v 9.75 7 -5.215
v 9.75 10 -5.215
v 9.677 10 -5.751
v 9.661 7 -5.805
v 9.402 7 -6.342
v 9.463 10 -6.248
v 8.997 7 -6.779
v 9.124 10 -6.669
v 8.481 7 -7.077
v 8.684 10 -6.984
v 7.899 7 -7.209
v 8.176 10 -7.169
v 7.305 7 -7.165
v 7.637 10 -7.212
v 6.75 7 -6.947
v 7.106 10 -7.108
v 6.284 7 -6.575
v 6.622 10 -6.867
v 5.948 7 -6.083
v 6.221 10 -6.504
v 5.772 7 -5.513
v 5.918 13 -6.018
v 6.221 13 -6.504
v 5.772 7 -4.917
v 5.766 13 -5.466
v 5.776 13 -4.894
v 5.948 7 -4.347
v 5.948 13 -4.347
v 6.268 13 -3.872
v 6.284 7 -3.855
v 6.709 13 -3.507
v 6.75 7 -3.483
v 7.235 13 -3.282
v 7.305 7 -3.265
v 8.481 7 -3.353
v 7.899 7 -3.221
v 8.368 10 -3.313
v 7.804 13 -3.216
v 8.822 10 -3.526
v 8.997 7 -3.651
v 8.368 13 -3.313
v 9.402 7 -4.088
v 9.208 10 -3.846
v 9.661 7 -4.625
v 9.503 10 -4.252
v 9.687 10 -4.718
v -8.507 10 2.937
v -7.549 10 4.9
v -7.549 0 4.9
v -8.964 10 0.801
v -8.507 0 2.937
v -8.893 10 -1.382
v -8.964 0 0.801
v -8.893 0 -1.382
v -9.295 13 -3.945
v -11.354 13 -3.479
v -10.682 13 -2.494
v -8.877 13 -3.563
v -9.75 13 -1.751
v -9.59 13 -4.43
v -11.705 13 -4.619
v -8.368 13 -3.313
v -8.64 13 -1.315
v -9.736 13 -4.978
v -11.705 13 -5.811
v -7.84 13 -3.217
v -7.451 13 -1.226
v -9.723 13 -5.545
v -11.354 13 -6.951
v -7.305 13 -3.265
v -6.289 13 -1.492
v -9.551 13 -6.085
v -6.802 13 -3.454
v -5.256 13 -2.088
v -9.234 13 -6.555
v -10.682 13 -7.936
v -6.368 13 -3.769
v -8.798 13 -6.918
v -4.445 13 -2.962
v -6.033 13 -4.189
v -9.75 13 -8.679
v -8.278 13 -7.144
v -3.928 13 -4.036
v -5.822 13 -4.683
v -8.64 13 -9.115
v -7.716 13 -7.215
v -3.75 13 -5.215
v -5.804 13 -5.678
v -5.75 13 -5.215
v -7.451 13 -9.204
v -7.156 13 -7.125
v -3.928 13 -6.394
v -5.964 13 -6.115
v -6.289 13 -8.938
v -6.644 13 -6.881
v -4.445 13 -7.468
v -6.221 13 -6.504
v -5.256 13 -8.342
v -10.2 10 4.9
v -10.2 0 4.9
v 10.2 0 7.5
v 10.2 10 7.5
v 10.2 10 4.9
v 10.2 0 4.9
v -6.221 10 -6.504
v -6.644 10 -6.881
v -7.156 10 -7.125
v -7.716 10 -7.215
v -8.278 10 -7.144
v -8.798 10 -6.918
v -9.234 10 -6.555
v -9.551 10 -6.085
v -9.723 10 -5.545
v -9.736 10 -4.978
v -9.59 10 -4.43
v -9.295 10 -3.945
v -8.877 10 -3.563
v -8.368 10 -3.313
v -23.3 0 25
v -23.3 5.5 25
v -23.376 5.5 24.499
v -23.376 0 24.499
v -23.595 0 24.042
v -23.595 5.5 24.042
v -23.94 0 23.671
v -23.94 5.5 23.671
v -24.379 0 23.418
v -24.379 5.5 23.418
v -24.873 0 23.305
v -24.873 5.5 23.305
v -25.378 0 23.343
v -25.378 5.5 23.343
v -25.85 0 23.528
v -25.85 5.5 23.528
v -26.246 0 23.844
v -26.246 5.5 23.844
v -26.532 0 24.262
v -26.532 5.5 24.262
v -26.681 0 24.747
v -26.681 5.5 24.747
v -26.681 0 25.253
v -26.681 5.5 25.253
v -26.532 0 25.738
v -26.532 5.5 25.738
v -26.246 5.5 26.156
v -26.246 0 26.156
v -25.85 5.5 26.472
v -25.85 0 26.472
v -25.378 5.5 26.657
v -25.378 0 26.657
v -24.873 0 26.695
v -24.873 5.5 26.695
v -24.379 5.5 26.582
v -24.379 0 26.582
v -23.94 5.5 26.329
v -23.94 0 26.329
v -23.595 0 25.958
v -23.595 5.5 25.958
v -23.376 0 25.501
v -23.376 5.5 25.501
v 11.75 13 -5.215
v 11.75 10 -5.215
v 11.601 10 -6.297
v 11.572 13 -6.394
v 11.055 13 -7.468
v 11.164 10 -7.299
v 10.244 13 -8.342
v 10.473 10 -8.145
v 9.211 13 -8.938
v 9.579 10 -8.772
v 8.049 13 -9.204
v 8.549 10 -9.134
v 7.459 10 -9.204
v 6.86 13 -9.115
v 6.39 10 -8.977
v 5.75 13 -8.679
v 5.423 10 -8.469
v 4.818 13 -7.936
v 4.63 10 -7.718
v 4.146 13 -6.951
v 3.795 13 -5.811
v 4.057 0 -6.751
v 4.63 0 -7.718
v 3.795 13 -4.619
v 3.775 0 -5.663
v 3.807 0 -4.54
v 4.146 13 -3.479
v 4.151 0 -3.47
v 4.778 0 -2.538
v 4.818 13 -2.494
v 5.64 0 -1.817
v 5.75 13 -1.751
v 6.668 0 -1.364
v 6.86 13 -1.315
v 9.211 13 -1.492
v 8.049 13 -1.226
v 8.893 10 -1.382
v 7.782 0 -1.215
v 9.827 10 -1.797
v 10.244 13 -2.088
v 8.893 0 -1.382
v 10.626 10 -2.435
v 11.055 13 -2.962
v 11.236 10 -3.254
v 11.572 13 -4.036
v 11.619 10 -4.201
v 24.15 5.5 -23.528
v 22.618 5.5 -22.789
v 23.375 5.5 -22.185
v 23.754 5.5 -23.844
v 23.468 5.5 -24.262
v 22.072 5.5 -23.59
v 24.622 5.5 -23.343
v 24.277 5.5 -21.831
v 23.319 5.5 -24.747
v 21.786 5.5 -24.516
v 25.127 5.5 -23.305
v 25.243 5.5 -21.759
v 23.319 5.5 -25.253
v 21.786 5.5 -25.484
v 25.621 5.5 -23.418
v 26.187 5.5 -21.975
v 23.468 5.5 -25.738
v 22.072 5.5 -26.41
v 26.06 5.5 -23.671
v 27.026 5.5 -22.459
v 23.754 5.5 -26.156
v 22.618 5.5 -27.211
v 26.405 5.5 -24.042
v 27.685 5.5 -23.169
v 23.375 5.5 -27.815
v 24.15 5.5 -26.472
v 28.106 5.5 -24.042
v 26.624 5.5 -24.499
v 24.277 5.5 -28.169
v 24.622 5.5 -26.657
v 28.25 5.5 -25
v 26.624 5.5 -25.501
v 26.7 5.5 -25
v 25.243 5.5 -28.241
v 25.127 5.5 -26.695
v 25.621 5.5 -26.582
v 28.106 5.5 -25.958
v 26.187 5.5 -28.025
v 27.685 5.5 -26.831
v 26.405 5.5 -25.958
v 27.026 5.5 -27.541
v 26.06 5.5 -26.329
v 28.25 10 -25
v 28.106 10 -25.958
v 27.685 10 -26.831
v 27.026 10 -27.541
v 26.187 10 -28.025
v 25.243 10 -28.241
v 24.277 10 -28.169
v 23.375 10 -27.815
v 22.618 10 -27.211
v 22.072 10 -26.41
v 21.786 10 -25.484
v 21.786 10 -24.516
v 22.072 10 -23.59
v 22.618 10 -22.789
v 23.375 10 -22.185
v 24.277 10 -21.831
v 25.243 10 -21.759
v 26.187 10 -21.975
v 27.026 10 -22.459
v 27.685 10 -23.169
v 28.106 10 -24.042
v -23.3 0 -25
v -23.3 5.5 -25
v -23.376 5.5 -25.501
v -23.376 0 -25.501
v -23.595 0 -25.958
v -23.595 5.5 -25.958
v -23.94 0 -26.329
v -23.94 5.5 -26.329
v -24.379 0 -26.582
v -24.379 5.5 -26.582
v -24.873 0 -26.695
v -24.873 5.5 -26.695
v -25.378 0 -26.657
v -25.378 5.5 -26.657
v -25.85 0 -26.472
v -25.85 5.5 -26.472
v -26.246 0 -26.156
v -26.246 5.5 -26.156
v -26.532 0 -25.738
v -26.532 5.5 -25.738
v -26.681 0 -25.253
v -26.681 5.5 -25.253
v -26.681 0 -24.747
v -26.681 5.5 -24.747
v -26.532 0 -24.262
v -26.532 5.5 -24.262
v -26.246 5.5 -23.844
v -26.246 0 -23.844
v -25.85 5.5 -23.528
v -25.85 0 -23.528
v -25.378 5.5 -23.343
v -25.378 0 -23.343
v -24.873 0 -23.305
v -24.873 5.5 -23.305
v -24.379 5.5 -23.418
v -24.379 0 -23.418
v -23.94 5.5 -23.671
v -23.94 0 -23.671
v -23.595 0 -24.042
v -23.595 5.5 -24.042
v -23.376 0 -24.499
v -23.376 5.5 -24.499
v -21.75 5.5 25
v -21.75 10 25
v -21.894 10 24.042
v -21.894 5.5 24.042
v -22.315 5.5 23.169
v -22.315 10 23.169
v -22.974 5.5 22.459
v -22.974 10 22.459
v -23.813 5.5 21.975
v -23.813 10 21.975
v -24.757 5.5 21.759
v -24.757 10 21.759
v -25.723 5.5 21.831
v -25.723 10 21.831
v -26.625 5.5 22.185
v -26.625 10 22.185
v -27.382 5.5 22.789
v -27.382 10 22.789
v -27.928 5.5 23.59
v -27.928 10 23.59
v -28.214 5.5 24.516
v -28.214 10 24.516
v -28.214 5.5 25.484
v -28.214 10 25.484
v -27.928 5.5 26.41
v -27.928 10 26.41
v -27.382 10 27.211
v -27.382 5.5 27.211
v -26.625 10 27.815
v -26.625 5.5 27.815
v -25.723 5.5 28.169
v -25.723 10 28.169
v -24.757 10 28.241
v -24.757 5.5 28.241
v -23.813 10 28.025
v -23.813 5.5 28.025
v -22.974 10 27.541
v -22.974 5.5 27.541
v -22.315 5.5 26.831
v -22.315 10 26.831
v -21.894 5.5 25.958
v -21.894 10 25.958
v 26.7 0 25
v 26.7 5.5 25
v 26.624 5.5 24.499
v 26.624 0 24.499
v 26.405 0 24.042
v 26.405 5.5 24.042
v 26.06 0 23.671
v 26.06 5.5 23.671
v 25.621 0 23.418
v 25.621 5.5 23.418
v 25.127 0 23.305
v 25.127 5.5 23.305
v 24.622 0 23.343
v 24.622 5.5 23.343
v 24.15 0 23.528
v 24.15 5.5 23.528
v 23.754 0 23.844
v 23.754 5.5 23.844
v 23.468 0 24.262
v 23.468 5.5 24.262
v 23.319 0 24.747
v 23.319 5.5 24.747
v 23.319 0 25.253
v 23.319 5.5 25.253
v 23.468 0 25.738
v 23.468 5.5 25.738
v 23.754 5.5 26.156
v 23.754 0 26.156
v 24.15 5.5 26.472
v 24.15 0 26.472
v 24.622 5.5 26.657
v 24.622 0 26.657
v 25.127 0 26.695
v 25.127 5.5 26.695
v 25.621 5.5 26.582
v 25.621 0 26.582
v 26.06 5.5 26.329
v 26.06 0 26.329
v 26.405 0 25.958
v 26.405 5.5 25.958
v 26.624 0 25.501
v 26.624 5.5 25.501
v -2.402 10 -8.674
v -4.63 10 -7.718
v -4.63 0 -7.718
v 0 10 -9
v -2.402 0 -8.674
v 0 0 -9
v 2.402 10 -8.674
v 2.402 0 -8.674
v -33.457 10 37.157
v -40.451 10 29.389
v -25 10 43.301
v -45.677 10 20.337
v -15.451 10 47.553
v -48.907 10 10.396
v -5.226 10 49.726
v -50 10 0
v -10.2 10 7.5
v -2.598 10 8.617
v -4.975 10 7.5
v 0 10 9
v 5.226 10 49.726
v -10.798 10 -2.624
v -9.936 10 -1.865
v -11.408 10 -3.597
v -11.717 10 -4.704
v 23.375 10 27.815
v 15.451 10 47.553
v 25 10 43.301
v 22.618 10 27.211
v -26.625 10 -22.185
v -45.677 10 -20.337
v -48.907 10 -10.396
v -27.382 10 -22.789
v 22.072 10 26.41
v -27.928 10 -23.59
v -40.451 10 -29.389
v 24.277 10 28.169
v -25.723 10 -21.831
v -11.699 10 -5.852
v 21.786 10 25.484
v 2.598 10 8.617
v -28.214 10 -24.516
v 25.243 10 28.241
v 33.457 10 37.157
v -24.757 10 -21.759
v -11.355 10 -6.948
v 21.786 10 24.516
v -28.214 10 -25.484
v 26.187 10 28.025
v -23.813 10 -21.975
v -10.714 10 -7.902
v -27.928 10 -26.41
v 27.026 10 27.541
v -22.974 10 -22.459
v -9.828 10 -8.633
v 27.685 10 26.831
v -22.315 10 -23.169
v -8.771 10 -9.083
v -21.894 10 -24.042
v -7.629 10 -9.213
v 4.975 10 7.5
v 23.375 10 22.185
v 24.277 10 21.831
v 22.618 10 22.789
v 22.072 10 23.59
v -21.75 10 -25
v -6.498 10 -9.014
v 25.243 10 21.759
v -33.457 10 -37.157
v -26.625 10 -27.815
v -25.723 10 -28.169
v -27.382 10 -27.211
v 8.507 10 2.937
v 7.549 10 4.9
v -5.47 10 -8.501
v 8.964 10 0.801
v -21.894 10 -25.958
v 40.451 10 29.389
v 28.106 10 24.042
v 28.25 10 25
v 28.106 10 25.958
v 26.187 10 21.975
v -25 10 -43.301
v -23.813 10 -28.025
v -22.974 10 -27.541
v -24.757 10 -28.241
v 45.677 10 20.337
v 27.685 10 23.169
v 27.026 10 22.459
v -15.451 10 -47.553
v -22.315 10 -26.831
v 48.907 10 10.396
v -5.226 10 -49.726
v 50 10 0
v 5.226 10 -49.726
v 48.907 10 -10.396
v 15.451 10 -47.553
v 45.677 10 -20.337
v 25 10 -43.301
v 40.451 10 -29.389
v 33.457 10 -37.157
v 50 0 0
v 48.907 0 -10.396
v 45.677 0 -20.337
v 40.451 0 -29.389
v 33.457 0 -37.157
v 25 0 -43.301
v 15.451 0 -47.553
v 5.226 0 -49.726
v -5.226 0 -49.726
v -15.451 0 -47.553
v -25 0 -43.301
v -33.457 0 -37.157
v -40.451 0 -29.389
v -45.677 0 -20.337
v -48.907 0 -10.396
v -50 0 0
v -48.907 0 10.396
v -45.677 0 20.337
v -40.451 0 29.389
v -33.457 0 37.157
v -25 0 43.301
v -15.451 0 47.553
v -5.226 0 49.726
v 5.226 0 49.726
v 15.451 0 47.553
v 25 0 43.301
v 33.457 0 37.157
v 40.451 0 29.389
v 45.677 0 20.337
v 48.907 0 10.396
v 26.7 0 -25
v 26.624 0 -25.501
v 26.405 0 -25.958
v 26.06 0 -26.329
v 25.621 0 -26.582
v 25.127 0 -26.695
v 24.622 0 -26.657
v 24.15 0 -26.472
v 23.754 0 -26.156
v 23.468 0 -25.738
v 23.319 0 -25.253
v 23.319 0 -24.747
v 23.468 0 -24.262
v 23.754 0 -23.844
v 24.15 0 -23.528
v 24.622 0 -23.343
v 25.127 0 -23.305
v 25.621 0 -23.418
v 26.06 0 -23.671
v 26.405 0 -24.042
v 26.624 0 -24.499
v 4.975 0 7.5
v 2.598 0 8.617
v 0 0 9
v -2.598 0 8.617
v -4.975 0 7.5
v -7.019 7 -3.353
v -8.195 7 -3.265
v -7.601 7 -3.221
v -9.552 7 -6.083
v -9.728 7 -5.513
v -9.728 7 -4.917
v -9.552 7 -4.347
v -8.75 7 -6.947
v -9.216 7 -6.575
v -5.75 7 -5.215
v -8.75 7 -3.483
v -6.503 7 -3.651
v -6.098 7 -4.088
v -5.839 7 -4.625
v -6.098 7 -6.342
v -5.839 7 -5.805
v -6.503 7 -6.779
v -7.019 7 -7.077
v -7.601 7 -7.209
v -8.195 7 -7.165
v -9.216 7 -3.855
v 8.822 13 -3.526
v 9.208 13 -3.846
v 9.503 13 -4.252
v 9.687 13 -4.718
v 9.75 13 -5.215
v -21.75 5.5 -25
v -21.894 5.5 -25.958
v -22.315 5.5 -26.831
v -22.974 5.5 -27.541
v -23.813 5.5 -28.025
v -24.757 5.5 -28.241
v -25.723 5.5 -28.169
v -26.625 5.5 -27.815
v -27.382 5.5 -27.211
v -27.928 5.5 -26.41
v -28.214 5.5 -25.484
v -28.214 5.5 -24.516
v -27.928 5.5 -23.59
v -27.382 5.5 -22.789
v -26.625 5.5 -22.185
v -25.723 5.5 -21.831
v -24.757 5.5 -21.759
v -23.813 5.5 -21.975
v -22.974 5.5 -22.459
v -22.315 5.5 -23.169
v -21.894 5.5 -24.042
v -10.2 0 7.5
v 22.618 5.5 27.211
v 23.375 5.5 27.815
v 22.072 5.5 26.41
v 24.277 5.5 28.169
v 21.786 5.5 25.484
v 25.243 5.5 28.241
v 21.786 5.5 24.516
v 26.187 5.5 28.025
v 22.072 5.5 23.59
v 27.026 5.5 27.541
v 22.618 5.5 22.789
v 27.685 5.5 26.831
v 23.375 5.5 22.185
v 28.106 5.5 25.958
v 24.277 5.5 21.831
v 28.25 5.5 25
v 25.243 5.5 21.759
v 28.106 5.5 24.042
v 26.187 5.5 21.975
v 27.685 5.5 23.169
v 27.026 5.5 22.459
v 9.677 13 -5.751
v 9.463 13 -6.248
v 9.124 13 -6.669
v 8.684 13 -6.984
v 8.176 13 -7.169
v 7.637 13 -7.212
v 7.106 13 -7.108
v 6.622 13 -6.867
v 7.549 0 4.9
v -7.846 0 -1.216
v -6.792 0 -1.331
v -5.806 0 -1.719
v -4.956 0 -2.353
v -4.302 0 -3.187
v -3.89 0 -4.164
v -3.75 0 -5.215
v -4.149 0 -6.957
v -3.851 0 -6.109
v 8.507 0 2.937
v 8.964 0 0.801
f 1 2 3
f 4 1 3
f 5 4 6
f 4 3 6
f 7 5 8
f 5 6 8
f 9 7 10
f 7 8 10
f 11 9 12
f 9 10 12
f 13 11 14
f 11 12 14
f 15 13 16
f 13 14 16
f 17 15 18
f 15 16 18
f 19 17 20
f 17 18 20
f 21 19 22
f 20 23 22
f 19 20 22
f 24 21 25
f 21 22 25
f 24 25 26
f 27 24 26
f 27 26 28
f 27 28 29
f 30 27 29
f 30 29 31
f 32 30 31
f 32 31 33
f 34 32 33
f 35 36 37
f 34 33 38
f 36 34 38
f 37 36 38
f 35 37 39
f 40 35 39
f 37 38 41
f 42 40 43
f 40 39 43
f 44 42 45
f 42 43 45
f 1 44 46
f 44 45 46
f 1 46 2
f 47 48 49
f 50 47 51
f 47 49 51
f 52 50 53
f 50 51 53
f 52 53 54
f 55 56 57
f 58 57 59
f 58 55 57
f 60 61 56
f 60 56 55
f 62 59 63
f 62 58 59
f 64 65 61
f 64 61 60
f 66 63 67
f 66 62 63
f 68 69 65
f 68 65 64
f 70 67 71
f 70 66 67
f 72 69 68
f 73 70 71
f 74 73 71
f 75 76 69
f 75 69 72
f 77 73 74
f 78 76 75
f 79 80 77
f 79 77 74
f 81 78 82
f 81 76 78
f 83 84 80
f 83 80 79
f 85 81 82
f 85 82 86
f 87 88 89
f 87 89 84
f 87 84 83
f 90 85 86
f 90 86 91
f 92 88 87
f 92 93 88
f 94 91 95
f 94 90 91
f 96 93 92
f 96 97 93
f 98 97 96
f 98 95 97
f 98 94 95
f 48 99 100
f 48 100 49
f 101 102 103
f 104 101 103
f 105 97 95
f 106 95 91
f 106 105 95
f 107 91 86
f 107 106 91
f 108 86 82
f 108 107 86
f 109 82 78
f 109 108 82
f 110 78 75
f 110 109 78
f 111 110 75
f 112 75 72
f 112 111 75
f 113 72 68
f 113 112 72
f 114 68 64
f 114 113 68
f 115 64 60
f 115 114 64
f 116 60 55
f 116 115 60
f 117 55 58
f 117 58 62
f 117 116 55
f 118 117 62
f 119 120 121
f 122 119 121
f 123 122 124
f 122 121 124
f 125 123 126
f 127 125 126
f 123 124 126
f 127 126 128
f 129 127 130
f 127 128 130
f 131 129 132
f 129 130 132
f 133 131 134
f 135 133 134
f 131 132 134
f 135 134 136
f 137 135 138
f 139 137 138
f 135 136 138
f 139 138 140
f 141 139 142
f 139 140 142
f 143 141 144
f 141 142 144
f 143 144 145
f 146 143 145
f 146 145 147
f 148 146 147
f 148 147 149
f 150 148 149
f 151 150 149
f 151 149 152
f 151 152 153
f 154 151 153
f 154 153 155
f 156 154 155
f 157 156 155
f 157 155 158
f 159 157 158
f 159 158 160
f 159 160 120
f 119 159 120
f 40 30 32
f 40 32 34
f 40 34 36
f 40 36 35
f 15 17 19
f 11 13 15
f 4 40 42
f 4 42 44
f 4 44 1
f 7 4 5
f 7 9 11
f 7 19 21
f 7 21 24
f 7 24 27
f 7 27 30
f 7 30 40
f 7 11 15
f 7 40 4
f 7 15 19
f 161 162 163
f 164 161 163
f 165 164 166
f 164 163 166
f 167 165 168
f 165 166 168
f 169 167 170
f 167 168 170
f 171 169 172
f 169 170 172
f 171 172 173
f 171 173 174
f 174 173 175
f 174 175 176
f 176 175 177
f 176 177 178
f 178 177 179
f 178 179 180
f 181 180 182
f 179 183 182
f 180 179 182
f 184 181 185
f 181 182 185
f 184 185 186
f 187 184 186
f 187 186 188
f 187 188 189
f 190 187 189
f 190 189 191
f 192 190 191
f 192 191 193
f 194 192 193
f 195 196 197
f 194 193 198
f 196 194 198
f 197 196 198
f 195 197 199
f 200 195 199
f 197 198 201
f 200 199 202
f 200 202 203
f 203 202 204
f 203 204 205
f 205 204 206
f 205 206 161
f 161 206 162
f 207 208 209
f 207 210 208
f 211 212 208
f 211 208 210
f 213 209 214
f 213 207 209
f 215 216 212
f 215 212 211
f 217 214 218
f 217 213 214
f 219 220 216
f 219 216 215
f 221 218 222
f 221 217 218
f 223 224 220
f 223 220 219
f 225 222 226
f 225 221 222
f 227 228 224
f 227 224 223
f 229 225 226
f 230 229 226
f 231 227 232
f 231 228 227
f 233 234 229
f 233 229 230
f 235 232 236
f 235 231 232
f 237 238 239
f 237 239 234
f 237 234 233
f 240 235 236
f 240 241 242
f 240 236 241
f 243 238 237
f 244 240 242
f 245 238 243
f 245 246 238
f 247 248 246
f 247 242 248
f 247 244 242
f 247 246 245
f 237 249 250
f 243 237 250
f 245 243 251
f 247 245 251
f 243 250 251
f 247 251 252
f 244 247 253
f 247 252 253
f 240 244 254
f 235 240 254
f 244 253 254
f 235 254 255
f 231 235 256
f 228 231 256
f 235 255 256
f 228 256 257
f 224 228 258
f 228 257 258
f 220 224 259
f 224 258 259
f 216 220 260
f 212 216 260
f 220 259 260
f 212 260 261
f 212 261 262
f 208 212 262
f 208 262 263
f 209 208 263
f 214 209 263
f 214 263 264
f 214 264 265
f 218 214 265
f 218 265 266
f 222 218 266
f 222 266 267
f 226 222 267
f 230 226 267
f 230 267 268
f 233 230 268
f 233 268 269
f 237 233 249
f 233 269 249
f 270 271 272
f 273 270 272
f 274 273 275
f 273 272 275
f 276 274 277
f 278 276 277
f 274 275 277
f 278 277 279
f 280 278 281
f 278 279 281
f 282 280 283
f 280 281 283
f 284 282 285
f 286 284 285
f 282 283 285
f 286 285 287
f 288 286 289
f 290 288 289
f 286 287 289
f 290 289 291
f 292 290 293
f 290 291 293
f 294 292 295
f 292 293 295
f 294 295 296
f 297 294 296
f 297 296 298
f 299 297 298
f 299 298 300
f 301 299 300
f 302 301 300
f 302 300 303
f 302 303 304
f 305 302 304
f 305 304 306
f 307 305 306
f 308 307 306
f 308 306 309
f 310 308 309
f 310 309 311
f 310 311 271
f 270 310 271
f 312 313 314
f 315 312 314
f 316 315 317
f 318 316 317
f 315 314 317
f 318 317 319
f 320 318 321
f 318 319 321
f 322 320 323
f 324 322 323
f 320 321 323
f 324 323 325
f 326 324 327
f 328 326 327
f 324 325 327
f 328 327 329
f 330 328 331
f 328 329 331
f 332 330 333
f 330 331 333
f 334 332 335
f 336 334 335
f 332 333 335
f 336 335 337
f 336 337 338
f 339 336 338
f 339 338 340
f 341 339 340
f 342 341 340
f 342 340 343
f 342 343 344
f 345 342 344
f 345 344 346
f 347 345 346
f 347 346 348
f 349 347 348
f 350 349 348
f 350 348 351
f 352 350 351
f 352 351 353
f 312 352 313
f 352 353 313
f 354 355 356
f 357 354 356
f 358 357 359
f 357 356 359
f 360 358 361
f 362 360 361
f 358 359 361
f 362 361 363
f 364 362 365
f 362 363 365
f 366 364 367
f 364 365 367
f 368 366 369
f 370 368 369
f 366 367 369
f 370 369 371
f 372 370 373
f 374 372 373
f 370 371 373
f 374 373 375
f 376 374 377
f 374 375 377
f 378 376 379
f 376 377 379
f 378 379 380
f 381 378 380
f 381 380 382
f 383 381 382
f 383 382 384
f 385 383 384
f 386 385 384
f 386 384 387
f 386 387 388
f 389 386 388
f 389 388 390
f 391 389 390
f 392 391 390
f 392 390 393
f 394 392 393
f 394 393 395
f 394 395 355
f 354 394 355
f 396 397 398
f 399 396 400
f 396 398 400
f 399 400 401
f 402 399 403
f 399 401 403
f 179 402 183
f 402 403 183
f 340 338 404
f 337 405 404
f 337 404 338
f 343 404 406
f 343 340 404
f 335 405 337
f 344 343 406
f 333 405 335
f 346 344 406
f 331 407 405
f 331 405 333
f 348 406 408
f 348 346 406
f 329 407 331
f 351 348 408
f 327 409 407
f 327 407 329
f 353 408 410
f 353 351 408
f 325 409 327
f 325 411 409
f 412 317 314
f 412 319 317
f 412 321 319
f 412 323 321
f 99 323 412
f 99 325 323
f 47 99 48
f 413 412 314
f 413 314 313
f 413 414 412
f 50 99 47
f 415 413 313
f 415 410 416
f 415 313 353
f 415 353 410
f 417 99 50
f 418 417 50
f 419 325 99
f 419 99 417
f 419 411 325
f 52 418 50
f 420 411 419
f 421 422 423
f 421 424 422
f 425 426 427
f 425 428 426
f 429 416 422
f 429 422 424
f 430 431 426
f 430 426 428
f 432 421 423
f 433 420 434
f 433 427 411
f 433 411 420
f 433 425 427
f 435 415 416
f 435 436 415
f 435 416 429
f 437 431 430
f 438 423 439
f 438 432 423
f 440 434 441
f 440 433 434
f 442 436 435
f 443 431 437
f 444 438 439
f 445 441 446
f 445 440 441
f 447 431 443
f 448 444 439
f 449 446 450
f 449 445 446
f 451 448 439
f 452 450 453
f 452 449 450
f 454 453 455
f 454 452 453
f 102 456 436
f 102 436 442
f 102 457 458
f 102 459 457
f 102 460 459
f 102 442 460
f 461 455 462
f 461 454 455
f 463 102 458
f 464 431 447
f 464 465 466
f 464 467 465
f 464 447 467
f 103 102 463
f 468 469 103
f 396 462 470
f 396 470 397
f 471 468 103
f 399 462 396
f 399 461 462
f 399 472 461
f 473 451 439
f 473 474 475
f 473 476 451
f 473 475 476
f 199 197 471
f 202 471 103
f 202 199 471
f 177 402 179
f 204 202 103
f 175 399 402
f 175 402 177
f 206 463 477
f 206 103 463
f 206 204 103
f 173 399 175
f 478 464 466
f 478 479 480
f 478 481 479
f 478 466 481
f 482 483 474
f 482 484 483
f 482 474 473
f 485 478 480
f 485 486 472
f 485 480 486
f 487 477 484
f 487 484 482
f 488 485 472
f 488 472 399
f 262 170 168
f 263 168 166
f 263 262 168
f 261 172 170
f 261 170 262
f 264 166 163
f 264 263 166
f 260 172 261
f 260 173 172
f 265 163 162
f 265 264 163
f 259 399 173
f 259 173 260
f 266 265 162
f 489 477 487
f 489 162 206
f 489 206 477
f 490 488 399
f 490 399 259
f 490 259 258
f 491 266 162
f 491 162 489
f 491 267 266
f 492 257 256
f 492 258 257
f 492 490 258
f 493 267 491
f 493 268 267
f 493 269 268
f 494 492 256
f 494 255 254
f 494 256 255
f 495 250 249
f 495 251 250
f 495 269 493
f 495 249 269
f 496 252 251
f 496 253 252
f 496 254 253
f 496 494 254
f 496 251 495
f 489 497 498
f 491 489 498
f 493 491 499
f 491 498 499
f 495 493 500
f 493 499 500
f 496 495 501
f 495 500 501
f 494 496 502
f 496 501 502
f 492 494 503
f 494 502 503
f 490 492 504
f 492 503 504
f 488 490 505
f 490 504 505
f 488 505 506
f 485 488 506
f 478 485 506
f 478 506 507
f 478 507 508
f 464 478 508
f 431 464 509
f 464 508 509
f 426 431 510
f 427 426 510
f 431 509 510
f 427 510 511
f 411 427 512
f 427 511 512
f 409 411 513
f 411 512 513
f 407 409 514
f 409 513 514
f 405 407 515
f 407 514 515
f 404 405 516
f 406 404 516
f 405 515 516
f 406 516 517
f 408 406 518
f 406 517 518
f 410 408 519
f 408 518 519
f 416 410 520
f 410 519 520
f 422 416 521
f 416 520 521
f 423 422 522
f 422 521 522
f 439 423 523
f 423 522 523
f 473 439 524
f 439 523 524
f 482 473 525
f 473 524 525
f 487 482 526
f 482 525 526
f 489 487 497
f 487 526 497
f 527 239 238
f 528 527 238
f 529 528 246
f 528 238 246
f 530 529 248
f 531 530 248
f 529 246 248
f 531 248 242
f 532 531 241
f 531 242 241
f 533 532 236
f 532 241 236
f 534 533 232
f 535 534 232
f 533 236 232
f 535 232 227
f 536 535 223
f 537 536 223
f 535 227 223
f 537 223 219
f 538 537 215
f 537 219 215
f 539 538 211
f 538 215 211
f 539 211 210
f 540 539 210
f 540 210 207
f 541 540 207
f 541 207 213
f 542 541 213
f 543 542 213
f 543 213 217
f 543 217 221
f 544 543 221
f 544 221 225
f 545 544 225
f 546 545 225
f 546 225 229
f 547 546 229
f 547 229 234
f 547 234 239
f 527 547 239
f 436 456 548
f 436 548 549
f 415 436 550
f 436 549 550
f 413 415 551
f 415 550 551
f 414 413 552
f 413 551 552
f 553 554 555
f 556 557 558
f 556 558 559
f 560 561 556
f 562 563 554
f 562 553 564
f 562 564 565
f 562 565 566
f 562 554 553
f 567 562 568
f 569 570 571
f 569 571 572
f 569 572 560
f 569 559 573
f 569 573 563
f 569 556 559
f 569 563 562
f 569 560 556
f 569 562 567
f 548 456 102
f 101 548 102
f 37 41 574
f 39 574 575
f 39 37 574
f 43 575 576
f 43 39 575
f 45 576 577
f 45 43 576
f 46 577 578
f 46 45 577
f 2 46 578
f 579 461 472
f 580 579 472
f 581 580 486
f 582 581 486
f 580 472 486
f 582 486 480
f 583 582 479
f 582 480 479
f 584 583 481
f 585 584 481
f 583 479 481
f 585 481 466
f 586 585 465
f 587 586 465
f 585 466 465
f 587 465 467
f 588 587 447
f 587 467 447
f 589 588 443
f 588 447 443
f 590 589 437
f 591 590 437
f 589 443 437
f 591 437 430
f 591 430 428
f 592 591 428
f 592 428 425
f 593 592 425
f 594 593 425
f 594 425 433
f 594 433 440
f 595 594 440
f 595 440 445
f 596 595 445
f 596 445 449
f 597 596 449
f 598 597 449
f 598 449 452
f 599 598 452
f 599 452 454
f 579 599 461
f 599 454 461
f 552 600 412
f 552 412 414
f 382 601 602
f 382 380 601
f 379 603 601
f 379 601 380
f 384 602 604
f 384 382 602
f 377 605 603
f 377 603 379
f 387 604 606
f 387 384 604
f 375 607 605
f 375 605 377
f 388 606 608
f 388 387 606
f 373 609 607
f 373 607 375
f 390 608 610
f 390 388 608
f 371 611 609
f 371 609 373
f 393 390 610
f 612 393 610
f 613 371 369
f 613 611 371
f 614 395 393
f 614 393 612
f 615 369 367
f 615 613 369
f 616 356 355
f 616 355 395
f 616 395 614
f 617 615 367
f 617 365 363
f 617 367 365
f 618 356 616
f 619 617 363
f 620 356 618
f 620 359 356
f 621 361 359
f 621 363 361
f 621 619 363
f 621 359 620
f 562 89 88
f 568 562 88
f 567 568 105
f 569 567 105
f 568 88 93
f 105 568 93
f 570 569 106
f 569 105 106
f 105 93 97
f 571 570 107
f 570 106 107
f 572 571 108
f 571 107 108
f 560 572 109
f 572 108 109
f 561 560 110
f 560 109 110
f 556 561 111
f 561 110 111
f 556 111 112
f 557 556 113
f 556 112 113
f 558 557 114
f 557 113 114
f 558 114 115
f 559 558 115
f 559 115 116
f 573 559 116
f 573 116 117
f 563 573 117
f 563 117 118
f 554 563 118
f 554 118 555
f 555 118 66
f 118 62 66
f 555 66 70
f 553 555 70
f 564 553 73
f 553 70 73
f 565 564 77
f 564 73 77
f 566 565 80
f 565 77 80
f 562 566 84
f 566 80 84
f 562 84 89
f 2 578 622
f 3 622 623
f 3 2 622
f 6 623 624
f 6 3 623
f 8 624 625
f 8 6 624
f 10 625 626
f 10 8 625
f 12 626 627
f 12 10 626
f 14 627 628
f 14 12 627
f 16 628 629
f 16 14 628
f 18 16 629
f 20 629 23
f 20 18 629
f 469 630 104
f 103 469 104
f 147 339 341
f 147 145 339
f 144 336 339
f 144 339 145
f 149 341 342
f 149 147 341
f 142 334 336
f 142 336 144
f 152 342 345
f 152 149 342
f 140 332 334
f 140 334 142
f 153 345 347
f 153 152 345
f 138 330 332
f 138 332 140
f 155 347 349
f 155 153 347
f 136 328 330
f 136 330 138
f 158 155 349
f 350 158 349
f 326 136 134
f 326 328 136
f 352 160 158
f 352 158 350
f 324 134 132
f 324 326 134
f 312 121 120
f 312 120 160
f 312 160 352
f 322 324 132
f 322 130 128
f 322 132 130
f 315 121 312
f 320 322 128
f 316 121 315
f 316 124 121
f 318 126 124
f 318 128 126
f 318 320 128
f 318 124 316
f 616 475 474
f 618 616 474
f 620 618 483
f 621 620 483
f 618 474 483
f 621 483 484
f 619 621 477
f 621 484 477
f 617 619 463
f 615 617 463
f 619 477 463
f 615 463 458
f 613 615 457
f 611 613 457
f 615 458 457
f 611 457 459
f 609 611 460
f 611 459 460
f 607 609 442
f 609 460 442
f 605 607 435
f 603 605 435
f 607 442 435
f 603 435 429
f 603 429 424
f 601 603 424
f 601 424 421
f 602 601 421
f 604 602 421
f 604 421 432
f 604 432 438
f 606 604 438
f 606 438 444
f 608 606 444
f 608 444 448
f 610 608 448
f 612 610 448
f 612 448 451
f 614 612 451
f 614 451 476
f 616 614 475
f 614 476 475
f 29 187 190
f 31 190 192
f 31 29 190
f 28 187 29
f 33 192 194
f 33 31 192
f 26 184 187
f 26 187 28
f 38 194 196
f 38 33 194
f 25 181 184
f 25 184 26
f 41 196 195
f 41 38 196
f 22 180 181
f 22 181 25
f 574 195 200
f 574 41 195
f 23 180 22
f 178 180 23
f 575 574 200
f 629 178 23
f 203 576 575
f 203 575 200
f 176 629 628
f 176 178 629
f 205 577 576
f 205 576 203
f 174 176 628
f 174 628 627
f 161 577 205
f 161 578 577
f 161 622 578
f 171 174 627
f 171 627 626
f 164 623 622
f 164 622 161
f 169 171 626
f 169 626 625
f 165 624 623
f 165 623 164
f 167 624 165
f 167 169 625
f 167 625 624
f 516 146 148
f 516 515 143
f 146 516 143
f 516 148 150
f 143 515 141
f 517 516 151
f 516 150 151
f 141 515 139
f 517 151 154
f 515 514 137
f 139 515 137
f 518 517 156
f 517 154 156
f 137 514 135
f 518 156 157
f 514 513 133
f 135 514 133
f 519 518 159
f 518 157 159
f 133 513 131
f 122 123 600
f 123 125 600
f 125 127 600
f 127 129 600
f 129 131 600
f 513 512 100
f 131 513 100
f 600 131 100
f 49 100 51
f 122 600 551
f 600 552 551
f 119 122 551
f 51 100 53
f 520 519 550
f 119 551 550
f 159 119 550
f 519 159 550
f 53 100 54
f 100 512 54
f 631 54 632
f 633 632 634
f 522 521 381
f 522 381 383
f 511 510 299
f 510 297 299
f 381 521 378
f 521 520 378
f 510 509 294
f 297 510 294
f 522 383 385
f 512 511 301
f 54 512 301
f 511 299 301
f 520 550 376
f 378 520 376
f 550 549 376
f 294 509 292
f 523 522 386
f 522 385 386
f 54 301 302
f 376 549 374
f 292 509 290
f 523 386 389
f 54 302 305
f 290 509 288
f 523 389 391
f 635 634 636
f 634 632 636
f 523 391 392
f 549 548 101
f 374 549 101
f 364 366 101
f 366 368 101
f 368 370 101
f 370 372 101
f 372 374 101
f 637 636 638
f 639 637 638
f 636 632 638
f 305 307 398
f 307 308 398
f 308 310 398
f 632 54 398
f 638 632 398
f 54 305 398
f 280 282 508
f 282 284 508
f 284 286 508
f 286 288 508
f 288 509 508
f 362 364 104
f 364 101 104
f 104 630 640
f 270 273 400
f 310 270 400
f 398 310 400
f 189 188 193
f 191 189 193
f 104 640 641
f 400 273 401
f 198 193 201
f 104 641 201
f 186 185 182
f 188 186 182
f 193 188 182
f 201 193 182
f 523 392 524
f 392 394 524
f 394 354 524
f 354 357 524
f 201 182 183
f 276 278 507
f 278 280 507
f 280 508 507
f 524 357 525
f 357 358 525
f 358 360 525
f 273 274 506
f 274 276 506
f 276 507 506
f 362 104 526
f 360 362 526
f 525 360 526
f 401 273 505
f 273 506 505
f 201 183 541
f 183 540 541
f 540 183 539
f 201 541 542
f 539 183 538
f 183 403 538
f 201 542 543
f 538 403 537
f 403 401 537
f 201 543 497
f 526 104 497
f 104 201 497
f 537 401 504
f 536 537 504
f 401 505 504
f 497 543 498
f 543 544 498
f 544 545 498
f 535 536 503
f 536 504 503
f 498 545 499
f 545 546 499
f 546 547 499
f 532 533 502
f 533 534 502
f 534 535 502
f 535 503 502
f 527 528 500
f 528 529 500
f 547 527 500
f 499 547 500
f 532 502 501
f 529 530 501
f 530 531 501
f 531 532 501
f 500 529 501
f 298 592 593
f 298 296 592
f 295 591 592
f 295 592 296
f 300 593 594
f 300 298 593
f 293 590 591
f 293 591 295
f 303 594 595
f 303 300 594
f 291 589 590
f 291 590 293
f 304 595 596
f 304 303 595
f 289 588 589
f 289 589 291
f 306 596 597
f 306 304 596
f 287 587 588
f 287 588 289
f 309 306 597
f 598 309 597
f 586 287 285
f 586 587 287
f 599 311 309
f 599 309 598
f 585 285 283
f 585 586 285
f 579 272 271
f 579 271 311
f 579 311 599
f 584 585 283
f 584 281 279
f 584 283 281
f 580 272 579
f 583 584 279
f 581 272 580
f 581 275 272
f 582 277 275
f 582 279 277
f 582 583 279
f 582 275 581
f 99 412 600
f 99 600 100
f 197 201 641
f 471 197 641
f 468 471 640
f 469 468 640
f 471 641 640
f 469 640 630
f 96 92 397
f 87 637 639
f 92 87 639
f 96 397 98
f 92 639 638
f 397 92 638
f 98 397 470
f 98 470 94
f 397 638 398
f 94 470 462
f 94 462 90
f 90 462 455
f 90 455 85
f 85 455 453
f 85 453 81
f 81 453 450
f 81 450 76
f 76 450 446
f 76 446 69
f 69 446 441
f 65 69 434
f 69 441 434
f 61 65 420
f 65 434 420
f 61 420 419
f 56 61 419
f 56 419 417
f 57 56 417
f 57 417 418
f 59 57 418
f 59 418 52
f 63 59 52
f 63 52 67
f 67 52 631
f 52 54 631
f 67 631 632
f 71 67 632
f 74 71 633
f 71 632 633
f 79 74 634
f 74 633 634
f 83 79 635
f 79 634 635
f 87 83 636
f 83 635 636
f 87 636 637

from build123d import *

# Parameters (mm, degrees)
SKIZZE1_R                       = 50
AUFSATZ_LINEAR_AUSTRAGEN1_DEPTH = 10
SKIZZE2_R                       = 1.7
SCHNITT_LINEAR_AUSTRAGEN1_DEPTH = 10
SKIZZE3_R                       = 3.25
SCHNITT_LINEAR_AUSTRAGEN2_DEPTH = 4.5
SKIZZE7_R                       = 9
SCHNITT_LINEAR_AUSTRAGEN5_DEPTH = 11
SKIZZE4_W                       = 20.4
SKIZZE4_H                       = 2.6
SCHNITT_LINEAR_AUSTRAGEN3_DEPTH = 10
AUFSATZ_LINEAR_START            = -10
SKIZZE5_R                       = 4
AUFSATZ_LINEAR_AUSTRAGEN2_DEPTH = 13
SKIZZE6_R                       = 2
SCHNITT_LINEAR_AUSTRAGEN4_DEPTH = 6


with BuildPart() as part:
    # Skizze1 → Aufsatz-Linear austragen1 (new body)
    with BuildSketch(Plane(origin=(0, 0, 0), x_dir=(1, 0, 0), z_dir=(0, 1, 0))):
        Circle(SKIZZE1_R)
    extrude(amount=AUFSATZ_LINEAR_AUSTRAGEN1_DEPTH)

    # Skizze2 → Schnitt-Linear austragen1 (cut)
    with BuildSketch(Plane(origin=(0, 10, 0), x_dir=(1, 0, 0), z_dir=(0, 1, 0))):
        with Locations((-25, 25)):
            Circle(SKIZZE2_R)
        with Locations((25, 25)):
            Circle(SKIZZE2_R)
        with Locations((25, -25)):
            Circle(SKIZZE2_R)
        with Locations((-25, -25)):
            Circle(SKIZZE2_R)
    extrude(amount=-SCHNITT_LINEAR_AUSTRAGEN1_DEPTH, mode=Mode.SUBTRACT)

    # Skizze3 → Schnitt-Linear austragen2 (cut)
    with BuildSketch(Plane(origin=(0, 10, 0), x_dir=(1, 0, 0), z_dir=(0, 1, 0))):
        with Locations((-25, 25)):
            Circle(SKIZZE3_R)
        with Locations((25, 25)):
            Circle(SKIZZE3_R)
        with Locations((25, -25)):
            Circle(SKIZZE3_R)
        with Locations((-25, -25)):
            Circle(SKIZZE3_R)
    extrude(amount=-SCHNITT_LINEAR_AUSTRAGEN2_DEPTH, mode=Mode.SUBTRACT)

    # Skizze7 → Schnitt-Linear austragen5 (cut, through all)
    with BuildSketch(Plane.XZ):
        Circle(SKIZZE7_R)
    extrude(amount=-SCHNITT_LINEAR_AUSTRAGEN5_DEPTH, mode=Mode.SUBTRACT)

    # Skizze4 → Schnitt-Linear austragen3 (cut)
    with BuildSketch(Plane(origin=(0, 10, 0), x_dir=(1, 0, 0), z_dir=(0, 1, 0))):
        with Locations((0, -6.2)):
            Rectangle(SKIZZE4_W, SKIZZE4_H)
    extrude(amount=-SCHNITT_LINEAR_AUSTRAGEN3_DEPTH, mode=Mode.SUBTRACT)

    # Skizze5 → Aufsatz-Linear austragen2 (add)
    with BuildSketch(Plane(origin=(0, 10, 0), x_dir=(1, 0, 0), z_dir=(0, 1, 0)).offset(AUFSATZ_LINEAR_START)):
        with Locations((-7.75, 5.215)):
            Circle(SKIZZE5_R)
        with BuildLine():
            ThreePointArc((-6.220782003, 6.503988874), (-9.409308992, 6.331554373), (-8.368075659, 3.312900507))
            ThreePointArc((-8.368075659, 3.312900507), (-7.466890464, 5.02449468), (-6.220782003, 6.503988874))
        make_face(mode=Mode.SUBTRACT)
        with Locations((7.75, 5.215)):
            Circle(SKIZZE5_R)
        with BuildLine():
            ThreePointArc((8.368075659, 3.312900507), (9.409308992, 6.331554373), (6.220782003, 6.503988874))
            ThreePointArc((6.220782003, 6.503988874), (7.466890464, 5.02449468), (8.368075659, 3.312900507))
        make_face(mode=Mode.SUBTRACT)
    extrude(amount=AUFSATZ_LINEAR_AUSTRAGEN2_DEPTH)

    # Skizze6 → Schnitt-Linear austragen4 (cut)
    with BuildSketch(Plane(origin=(0, 12.999999992, 0), x_dir=(1, 0, 0), z_dir=(0, 1, 0))):
        with Locations((-7.75, 5.215)):
            Circle(SKIZZE6_R)
        with Locations((7.75, 5.215)):
            Circle(SKIZZE6_R)
    extrude(amount=-SCHNITT_LINEAR_AUSTRAGEN4_DEPTH, mode=Mode.SUBTRACT)


solid = part.part
